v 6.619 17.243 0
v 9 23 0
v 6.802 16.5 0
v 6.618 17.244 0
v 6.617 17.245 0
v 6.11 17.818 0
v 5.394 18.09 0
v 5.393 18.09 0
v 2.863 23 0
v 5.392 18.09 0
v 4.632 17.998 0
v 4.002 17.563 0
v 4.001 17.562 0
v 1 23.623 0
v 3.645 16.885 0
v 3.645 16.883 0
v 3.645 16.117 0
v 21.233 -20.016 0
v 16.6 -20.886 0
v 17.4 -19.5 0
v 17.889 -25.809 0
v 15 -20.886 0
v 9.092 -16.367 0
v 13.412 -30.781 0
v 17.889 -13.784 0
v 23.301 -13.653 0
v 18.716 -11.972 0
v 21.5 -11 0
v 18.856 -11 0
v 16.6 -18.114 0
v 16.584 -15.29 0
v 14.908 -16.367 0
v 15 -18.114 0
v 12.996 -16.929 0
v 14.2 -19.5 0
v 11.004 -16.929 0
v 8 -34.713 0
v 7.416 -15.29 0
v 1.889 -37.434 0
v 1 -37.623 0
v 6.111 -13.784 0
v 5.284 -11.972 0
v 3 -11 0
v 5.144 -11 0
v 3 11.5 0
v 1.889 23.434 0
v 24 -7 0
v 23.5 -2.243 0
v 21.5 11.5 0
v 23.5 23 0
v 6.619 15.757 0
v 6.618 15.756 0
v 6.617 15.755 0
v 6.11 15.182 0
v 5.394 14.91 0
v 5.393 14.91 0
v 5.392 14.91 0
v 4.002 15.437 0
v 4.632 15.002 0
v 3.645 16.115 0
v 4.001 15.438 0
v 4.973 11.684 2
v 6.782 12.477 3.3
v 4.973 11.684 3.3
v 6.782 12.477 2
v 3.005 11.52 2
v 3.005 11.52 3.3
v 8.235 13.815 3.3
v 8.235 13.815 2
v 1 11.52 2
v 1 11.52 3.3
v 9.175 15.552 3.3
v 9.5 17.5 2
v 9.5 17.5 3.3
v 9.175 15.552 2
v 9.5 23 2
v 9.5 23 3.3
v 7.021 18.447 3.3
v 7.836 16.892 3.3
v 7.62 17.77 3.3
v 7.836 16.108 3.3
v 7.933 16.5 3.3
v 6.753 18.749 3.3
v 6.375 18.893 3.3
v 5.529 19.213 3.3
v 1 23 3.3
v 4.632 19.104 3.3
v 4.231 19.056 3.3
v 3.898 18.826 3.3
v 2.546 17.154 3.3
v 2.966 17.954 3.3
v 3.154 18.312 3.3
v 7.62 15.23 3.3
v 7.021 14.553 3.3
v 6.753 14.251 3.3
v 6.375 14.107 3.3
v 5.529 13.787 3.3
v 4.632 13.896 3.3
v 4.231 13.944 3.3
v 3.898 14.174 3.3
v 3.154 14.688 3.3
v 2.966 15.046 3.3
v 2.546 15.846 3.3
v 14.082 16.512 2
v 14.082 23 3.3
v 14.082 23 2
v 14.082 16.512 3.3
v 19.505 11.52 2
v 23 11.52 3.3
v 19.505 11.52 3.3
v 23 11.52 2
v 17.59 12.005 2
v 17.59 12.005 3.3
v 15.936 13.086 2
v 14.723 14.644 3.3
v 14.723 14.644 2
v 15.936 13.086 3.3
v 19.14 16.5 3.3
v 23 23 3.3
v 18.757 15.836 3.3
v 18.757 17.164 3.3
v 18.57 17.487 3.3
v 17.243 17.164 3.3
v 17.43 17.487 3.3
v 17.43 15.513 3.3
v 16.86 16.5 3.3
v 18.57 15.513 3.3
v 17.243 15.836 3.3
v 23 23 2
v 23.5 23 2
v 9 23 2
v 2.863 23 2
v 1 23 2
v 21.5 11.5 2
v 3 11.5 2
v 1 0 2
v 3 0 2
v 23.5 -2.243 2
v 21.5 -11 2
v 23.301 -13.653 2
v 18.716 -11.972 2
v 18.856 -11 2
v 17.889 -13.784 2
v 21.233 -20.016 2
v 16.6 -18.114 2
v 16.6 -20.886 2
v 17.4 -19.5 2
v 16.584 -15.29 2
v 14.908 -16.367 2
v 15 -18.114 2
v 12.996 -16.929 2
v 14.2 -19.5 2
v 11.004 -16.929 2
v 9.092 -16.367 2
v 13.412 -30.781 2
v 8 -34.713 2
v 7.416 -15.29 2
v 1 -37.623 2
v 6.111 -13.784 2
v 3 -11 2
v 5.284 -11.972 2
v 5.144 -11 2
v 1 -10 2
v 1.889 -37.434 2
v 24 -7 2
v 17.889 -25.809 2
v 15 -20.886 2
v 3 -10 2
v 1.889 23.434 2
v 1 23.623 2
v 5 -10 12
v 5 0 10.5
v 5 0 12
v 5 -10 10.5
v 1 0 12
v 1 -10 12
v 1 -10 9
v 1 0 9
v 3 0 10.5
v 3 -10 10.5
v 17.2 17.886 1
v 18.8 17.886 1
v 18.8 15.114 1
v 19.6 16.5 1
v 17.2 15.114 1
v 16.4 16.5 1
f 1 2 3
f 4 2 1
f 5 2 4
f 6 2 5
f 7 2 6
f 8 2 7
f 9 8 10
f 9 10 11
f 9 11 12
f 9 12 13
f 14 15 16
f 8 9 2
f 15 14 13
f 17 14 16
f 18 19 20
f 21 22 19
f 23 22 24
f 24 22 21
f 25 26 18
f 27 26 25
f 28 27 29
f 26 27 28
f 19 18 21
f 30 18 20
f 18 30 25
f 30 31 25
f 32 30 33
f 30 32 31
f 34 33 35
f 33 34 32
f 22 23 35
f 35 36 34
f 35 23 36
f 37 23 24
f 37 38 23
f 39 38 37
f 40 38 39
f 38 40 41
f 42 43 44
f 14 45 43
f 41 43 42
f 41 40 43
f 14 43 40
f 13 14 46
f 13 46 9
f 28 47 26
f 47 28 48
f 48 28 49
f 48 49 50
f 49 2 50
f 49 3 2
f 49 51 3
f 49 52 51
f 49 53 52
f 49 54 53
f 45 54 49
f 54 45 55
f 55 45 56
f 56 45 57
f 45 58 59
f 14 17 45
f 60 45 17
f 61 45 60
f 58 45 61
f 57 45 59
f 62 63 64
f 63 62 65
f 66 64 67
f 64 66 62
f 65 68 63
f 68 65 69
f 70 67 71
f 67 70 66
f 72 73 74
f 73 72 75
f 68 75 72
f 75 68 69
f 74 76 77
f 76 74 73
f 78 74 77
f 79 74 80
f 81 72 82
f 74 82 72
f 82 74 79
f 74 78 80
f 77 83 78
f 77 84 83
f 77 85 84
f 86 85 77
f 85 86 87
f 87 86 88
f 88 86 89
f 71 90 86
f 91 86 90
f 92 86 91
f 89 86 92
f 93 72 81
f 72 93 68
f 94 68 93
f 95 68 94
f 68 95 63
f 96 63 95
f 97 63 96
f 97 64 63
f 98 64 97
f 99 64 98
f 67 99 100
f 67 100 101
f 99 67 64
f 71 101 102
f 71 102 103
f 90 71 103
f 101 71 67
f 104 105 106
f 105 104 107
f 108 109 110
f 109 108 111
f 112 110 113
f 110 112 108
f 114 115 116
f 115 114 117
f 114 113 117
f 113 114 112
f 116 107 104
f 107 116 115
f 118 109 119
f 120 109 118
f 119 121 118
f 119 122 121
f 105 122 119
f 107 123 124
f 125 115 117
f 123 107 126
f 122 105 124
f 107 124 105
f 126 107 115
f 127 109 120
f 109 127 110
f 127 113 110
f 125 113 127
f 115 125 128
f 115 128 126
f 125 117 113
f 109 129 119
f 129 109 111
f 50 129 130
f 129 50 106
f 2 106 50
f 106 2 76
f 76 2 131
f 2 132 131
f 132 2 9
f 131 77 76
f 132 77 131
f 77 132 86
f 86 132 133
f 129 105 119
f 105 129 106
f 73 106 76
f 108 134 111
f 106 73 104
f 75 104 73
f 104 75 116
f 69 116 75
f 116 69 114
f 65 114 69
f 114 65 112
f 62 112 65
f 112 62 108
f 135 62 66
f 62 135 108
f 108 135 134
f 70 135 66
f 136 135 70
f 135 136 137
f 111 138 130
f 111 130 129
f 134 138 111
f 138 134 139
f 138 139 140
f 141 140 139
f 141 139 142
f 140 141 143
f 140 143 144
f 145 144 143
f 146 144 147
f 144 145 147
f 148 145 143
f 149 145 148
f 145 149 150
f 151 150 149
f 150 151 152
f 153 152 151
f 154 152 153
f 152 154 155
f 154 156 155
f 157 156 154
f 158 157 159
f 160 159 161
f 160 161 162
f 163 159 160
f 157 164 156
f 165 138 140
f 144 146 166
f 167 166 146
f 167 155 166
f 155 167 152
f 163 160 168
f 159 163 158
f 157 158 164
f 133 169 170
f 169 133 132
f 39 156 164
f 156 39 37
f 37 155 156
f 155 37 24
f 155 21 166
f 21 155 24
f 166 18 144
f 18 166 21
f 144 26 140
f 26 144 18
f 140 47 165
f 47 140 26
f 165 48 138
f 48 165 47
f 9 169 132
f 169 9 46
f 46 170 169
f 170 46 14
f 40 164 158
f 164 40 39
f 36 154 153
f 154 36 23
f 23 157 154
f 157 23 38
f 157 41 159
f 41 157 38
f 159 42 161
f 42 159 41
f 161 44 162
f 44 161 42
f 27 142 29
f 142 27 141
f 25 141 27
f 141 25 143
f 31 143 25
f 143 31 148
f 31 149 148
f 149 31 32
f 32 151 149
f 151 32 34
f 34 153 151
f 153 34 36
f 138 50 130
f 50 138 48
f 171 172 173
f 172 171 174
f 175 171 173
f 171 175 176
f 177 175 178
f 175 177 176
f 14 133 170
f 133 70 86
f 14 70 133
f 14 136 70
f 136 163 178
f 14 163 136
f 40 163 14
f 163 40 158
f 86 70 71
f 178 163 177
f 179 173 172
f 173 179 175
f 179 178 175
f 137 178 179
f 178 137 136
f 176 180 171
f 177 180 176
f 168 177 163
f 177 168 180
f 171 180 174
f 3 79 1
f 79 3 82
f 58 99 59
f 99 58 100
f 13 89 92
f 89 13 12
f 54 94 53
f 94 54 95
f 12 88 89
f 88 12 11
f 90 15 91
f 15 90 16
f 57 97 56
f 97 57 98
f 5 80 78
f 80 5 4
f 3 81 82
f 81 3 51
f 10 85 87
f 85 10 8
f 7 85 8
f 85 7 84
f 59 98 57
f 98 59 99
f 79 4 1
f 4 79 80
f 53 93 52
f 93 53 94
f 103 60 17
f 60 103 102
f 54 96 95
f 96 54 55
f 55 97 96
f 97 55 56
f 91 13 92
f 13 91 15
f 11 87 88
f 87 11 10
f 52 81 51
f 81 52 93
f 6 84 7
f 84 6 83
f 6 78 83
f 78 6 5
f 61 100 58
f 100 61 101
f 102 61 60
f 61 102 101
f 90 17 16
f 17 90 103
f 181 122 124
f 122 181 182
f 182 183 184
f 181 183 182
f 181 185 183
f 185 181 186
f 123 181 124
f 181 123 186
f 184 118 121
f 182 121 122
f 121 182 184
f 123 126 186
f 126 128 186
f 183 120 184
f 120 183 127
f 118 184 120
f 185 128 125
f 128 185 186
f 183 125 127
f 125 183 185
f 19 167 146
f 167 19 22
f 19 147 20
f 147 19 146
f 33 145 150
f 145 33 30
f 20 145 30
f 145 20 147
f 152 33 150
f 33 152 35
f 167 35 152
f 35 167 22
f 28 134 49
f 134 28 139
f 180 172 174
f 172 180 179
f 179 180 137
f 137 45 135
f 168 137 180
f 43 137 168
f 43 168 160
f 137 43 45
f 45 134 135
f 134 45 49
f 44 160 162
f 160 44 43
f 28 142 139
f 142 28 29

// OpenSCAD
difference() {
    union() {
        
        color([1, 0, 0])
        linear_extrude(2)
        difference() {
            translate([-8, -7, 0])
                circle(32);
            translate([12, -10, 0])
                circle(7);
        }
        // Apoios para parafusos
        difference() {
            color([1, 0, 0]) {
                
                translate([-2.5, 17.5, 0]) 
                    minkowski() {
                        cylinder(h=2.5, r=6);
                        cube([6,6,.8]);
                    }
                translate([20, 17.5, 0])
                    minkowski() {
                        cylinder(h=2.5, r=6);
                        cube([6,6,.8]);
                    }
            }
            union() {
                translate([23, 11.5,0])
                    cube([40, 40, 4]);
                translate([0, 23,0])
                    cube([40, 20, 4]);
                }
        }
        //Fechar ponta do sensor no semi circulo
        translate([9, 11, 0])
                cube([14, 12, 2]);

        //Reforço cilindro Externo
        translate([19, -7, 0])
                cube([4.5, 30, 2]);

        // Abraço do sensor
        color([0, 0, 0])
        translate([1, -10, 2])
            cube([4, 10, 10]);
    }
    // Remover resto do cilindro
    translate([-79, -50, -1]) {
        cube([80, 100, 10]);
    }
    
    // Parafusos
    color([1, 0, 0])
    union() {
        translate([5.2,16.5, -0.005])
        cylinder(h=7, r1=1.6, r2=4);
        
        translate([18,16.5, 1])
        cylinder(h=3, r1=1.6, r2=1);
        
        translate([15.8, -19.5, -5])
        cylinder(h=10, r1=1.6, r2=1.6);
    };

    //Corpo do Sensor
    translate([3, -11, -1])
    color([0, 0, 1])
        cube([18.5, 22.5, 11.5]);
}
